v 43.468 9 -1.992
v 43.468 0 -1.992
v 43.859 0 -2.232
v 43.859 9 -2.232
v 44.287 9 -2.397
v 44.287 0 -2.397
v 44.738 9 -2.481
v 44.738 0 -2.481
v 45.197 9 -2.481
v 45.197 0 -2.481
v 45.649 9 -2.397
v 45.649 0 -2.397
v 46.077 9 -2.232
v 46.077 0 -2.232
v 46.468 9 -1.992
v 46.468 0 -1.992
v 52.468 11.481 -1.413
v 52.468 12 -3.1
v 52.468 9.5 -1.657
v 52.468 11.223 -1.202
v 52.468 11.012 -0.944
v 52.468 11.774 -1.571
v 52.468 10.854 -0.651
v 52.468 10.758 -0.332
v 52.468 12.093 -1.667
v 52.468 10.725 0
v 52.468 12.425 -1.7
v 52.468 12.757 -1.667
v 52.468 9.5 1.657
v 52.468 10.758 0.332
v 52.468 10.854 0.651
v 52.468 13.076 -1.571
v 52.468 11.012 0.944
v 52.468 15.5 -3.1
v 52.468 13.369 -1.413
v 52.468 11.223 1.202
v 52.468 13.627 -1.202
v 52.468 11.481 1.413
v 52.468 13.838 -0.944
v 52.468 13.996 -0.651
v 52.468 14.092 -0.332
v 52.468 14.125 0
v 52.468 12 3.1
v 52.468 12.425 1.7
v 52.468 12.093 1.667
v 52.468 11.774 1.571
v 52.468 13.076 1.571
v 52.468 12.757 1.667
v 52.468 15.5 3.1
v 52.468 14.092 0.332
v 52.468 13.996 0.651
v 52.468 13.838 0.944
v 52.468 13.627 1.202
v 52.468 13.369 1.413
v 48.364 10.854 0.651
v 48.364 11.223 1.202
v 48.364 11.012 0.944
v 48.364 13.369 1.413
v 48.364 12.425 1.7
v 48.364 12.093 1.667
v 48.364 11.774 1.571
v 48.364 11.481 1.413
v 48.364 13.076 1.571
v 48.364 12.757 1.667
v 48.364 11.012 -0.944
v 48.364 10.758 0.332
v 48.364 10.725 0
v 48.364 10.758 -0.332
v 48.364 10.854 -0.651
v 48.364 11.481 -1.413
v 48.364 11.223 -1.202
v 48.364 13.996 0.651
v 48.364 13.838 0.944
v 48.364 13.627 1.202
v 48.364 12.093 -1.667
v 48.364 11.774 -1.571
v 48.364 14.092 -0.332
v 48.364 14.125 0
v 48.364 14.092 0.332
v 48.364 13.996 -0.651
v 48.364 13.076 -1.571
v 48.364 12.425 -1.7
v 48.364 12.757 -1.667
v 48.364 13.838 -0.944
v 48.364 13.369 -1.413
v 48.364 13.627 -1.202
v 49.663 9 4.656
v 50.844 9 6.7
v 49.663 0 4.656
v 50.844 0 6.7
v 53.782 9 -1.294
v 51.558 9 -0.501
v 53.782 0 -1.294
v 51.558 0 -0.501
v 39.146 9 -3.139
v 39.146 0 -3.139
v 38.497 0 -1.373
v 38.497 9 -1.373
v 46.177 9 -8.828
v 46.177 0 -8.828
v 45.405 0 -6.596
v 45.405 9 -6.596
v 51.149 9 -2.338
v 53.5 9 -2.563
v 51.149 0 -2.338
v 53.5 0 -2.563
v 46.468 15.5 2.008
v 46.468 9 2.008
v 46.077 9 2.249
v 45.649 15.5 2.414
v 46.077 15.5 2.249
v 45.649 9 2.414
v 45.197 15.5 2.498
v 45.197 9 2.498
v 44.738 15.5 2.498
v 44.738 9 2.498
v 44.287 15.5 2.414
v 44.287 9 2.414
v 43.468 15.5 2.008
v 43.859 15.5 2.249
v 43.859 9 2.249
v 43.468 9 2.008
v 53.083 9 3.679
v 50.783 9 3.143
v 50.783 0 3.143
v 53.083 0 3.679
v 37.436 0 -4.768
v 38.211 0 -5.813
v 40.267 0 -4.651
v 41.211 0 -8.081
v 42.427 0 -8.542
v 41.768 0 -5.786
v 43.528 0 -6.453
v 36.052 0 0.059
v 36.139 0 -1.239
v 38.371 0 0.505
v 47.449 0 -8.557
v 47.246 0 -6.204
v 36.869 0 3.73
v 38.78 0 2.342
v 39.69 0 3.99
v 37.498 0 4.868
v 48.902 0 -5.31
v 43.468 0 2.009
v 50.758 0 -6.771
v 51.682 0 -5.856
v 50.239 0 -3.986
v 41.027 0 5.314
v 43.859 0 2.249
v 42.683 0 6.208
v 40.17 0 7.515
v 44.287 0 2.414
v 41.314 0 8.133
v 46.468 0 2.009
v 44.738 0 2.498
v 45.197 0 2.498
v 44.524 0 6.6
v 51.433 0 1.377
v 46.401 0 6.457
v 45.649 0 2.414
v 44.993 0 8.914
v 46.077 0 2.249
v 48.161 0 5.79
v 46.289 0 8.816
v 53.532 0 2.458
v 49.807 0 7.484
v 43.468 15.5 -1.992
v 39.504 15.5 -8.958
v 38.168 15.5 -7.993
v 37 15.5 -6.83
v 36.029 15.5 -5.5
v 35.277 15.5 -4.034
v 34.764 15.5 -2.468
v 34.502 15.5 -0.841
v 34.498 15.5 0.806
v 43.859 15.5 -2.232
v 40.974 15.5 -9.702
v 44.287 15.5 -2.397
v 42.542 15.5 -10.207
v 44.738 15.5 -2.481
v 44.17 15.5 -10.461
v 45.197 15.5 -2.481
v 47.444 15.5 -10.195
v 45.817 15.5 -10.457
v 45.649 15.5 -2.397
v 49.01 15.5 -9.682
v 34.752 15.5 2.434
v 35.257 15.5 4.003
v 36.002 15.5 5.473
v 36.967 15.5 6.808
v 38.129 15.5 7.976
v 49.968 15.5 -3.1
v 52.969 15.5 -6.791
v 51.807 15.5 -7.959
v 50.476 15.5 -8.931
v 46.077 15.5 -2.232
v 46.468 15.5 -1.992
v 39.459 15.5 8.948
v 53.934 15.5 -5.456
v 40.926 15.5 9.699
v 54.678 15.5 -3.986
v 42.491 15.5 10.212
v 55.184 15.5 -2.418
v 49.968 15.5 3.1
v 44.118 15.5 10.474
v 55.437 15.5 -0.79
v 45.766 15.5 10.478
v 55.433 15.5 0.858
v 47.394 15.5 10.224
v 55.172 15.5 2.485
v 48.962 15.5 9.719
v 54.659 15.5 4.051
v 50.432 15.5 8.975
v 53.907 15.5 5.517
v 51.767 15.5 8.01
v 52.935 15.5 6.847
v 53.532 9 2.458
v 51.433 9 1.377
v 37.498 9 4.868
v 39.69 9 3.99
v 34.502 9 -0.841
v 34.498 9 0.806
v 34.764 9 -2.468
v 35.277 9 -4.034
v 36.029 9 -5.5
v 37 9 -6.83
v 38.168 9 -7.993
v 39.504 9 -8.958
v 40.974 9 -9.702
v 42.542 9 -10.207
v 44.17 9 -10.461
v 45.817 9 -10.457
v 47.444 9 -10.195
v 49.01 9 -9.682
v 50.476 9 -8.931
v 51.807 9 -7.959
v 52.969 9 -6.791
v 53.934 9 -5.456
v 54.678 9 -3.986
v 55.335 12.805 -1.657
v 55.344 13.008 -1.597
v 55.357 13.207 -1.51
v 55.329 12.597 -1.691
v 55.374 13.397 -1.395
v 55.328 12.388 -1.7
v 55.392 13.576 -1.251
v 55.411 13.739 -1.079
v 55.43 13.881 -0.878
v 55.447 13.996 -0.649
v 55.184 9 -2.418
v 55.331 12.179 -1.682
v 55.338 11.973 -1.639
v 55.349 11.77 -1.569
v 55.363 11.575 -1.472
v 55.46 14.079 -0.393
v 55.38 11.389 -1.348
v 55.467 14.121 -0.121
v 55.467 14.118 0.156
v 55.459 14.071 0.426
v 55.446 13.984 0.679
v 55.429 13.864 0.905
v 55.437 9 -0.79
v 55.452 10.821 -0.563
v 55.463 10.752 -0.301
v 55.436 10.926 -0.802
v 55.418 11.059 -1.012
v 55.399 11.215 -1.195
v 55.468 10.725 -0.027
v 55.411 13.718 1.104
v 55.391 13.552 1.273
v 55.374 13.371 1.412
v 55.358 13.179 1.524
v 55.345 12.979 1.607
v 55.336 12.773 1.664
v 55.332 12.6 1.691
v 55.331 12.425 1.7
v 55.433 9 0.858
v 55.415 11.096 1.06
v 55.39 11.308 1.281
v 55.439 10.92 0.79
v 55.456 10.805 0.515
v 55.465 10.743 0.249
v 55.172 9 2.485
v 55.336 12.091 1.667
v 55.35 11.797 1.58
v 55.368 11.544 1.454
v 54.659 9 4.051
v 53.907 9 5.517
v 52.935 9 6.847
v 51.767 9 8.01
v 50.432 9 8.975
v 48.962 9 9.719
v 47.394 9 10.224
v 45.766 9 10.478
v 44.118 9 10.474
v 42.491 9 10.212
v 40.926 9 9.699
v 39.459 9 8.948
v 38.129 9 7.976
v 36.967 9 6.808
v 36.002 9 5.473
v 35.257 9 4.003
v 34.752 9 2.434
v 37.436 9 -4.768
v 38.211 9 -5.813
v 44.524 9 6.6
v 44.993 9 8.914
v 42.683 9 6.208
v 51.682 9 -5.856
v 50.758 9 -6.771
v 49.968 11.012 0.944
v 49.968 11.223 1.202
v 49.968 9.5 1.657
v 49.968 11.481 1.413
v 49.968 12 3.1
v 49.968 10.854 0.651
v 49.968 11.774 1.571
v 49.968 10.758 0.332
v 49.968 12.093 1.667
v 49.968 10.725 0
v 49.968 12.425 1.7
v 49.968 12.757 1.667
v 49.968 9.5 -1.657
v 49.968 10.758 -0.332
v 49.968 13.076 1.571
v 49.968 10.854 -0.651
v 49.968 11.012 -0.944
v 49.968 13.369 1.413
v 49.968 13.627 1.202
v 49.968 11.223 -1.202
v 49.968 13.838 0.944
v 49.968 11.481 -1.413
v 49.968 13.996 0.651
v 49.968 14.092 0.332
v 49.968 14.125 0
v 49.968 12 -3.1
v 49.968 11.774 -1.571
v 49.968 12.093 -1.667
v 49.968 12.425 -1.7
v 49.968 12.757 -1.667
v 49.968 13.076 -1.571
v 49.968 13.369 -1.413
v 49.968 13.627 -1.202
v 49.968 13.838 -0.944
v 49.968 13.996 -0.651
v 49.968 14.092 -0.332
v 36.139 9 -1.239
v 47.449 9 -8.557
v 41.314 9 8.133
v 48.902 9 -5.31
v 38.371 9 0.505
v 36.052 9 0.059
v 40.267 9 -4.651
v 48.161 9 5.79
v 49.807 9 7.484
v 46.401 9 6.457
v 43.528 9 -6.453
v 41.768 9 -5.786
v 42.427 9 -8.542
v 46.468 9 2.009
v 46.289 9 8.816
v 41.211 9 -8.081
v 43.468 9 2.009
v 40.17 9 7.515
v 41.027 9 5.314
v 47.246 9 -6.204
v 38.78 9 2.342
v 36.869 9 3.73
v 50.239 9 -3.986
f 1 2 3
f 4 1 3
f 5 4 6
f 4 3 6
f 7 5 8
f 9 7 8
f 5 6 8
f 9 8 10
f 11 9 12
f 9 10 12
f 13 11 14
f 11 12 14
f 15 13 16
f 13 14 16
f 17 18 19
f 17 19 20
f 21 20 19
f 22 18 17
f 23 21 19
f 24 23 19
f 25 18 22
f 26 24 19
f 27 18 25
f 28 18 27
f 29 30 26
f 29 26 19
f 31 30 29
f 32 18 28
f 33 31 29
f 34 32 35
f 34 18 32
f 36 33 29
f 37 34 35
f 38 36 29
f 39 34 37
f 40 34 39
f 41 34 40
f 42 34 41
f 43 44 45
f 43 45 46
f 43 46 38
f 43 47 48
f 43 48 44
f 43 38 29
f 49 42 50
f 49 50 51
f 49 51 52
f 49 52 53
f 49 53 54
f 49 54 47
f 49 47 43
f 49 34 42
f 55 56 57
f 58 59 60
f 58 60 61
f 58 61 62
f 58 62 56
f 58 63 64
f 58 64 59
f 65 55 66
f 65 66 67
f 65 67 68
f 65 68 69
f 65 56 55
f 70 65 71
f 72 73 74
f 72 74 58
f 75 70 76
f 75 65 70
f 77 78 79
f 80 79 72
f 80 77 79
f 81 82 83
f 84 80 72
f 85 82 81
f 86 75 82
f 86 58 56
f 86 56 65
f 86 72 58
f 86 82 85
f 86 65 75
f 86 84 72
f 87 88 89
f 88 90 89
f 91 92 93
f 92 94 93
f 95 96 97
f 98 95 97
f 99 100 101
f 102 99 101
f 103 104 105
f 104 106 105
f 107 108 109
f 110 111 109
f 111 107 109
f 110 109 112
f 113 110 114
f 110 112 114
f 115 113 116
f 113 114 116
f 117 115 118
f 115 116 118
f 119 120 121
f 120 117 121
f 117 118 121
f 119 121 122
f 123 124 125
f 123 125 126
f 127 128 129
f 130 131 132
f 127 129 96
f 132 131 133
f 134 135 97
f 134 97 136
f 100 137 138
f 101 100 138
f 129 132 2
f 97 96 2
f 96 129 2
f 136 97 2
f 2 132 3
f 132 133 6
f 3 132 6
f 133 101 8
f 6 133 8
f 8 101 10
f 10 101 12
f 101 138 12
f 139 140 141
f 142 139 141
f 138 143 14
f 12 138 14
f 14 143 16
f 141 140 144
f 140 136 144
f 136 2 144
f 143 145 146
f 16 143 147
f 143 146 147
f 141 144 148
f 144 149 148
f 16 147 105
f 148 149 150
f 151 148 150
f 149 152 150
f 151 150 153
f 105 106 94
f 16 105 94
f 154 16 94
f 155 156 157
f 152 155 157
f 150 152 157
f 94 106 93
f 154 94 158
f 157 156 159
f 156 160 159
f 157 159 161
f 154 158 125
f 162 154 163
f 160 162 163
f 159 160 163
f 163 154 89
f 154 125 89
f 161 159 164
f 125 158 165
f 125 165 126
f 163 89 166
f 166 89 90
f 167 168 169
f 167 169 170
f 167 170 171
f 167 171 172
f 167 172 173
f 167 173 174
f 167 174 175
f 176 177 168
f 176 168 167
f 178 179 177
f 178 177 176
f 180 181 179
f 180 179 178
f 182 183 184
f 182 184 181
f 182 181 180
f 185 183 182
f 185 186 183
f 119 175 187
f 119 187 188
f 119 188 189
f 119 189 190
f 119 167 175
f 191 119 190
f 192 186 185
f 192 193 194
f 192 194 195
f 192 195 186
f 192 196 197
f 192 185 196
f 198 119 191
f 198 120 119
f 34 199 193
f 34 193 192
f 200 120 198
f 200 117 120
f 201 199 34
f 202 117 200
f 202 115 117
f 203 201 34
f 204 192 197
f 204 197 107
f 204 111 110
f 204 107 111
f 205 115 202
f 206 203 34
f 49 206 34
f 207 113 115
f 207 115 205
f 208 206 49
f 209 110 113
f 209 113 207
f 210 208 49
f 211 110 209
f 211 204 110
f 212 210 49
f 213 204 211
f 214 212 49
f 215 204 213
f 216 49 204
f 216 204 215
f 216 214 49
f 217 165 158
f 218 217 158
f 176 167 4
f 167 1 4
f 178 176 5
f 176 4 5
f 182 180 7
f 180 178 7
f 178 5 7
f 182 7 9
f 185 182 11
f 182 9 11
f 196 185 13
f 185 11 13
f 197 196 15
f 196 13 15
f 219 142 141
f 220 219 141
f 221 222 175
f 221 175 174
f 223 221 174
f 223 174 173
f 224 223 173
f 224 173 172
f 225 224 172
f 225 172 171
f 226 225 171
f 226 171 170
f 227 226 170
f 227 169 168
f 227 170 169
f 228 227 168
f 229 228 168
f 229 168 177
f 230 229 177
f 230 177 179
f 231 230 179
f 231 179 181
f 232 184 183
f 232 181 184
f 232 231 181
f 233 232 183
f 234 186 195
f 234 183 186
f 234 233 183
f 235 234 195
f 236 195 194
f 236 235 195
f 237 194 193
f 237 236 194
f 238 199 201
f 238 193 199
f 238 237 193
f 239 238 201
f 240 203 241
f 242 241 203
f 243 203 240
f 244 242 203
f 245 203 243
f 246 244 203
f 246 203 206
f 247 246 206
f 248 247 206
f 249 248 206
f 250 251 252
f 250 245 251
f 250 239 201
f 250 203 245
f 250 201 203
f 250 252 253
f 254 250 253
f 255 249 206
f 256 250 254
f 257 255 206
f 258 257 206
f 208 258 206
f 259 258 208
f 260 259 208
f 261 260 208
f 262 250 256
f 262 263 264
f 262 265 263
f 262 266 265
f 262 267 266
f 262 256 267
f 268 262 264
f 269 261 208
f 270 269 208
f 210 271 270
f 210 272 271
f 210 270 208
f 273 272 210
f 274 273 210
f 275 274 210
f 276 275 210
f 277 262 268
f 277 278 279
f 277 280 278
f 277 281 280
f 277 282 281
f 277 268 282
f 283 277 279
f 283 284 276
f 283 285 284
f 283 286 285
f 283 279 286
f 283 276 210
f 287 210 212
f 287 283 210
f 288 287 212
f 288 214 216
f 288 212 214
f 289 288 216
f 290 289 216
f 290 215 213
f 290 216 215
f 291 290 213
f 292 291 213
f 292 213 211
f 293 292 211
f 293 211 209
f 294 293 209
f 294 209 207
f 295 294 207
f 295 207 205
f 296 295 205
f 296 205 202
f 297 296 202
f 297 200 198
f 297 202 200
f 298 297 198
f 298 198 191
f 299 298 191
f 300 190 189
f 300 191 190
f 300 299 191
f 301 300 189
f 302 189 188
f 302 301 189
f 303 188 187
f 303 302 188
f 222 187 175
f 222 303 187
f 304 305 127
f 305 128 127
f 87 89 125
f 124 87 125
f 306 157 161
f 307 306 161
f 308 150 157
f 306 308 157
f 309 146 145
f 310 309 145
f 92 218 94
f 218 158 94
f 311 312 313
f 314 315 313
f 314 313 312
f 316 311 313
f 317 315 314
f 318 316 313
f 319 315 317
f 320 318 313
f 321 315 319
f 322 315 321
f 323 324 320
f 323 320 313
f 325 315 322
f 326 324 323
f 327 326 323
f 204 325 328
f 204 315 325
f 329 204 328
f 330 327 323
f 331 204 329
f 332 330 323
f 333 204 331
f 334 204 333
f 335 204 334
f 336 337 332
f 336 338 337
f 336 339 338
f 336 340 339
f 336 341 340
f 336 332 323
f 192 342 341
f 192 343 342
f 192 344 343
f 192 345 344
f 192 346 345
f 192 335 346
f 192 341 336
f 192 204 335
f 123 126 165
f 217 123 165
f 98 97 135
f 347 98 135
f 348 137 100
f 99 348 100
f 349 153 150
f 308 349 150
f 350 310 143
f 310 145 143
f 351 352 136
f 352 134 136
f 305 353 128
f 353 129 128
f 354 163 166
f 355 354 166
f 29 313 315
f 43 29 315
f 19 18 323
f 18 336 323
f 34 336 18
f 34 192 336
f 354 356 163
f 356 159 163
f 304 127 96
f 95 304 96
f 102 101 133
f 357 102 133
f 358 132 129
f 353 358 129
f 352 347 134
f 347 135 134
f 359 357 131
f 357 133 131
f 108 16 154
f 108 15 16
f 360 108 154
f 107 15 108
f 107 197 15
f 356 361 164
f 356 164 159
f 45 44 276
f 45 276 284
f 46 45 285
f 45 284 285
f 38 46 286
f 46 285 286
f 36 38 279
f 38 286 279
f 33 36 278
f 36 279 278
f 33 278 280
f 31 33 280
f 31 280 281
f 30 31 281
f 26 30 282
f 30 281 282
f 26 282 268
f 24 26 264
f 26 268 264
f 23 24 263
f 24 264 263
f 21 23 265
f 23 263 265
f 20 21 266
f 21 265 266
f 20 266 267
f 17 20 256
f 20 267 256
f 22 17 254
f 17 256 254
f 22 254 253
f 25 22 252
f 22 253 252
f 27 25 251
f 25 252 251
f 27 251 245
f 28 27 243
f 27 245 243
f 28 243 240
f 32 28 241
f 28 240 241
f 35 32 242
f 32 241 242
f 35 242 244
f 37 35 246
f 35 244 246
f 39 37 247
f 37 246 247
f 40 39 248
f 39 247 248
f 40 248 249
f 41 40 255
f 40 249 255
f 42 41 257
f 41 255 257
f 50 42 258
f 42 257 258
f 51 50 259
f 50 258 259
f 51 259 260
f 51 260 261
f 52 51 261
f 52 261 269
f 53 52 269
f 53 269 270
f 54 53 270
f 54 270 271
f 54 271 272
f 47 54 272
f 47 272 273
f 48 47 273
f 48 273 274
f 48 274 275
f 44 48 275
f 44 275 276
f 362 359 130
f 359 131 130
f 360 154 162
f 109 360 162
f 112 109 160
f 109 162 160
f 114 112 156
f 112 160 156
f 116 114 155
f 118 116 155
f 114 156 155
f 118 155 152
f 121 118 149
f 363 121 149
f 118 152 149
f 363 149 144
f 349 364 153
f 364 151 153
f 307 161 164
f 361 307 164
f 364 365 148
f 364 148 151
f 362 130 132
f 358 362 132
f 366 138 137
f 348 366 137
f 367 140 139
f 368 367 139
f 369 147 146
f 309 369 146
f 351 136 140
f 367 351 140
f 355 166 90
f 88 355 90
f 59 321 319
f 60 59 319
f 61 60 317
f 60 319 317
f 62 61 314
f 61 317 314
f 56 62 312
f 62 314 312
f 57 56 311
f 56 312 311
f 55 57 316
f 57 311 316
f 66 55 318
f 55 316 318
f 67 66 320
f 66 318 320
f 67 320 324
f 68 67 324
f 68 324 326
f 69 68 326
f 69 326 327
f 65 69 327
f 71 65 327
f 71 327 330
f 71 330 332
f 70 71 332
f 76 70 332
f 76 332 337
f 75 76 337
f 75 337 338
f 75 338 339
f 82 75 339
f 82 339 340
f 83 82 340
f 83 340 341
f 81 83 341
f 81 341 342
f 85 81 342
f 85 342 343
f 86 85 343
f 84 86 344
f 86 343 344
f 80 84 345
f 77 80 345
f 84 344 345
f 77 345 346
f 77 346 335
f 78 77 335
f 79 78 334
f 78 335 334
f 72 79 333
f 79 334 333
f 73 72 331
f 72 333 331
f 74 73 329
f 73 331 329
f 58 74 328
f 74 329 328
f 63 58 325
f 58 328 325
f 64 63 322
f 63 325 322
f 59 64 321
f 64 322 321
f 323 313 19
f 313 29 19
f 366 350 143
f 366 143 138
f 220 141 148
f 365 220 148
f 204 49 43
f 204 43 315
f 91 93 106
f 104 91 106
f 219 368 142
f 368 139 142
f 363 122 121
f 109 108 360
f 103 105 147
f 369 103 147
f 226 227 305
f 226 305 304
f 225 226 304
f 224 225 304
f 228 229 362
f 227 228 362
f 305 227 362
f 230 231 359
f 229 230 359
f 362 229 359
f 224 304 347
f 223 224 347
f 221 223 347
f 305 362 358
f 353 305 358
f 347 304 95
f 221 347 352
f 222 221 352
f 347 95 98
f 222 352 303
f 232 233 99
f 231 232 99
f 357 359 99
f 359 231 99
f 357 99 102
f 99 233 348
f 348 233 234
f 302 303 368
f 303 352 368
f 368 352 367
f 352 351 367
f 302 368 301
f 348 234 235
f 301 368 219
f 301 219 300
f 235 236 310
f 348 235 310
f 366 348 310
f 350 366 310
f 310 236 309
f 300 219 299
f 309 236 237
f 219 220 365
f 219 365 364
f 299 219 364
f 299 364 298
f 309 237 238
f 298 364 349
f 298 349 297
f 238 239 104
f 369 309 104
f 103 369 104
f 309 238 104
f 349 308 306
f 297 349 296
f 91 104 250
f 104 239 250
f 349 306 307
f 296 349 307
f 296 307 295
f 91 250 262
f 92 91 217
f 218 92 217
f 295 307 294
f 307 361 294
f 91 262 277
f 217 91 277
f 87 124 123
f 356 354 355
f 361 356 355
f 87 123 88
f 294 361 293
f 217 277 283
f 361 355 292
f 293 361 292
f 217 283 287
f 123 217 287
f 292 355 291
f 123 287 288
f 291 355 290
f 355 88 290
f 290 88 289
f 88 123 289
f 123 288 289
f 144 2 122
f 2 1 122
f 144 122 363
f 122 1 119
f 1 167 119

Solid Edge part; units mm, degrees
sketch "Sketch1" plane through (0, 0, 0) normal (0, -1, 0) x (1, 0, 0)
  line L0 (46.2892, 8.8157) -> (46.4009, 6.4567)
  line L1 (46.4009, 6.4567) -> (48.1612, 5.7905)
  line L2 (48.1612, 5.7905) -> (49.8066, 7.4845)
  line L3 (49.8066, 7.4845) -> (50.8439, 6.7003)
  line L4 (50.8439, 6.7003) -> (49.6626, 4.6555)
  line L5 (49.6626, 4.6555) -> (50.7833, 3.1434)
  line L6 (50.7833, 3.1434) -> (53.0833, 3.679)
  line L7 (53.0833, 3.679) -> (53.5319, 2.4584)
  line L8 (53.5319, 2.4584) -> (51.4326, 1.3769)
  line L9 (51.4326, 1.3769) -> (51.5579, -0.5011)
  line L10 (51.5579, -0.5011) -> (53.7824, -1.2941)
  line L11 (53.7824, -1.2941) -> (53.4999, -2.5634)
  line L12 (53.4999, -2.5634) -> (51.1491, -2.3382)
  line L13 (51.1491, -2.3382) -> (50.2393, -3.9858)
  line L14 (50.2393, -3.9858) -> (51.6818, -5.8556)
  line L15 (51.6818, -5.8556) -> (50.7579, -6.7706)
  line L16 (50.7579, -6.7706) -> (48.9022, -5.3101)
  line L17 (48.9022, -5.3101) -> (47.2459, -6.2045)
  line L18 (47.2459, -6.2045) -> (47.4486, -8.5573)
  line L19 (47.4486, -8.5573) -> (46.1767, -8.8276)
  line L20 (46.1767, -8.8276) -> (45.4049, -6.5958)
  line L21 (45.4049, -6.5958) -> (43.5283, -6.4526)
  line L22 (43.5283, -6.4526) -> (42.4267, -8.5415)
  line L23 (42.4267, -8.5415) -> (41.2106, -8.0813)
  line L24 (41.2106, -8.0813) -> (41.768, -5.7865)
  line L25 (41.768, -5.7865) -> (40.2667, -4.6514)
  line L26 (40.2667, -4.6514) -> (38.2107, -5.8132)
  line L27 (38.2107, -5.8132) -> (37.4364, -4.7685)
  line L28 (37.4364, -4.7685) -> (39.1459, -3.1393)
  line L29 (39.1459, -3.1393) -> (38.4966, -1.3728)
  line L30 (38.4966, -1.3728) -> (36.1389, -1.2386)
  line L31 (36.1389, -1.2386) -> (36.0523, 0.0589)
  line L32 (36.0523, 0.0589) -> (38.3713, 0.5052)
  line L33 (38.3713, 0.5052) -> (38.7801, 2.3423)
  line L34 (38.7801, 2.3423) -> (36.8691, 3.73)
  line L35 (36.8691, 3.73) -> (37.498, 4.8685)
  line L36 (37.498, 4.8685) -> (39.6899, 3.99)
  line L37 (39.6899, 3.99) -> (41.0271, 5.3145)
  line L38 (41.0271, 5.3145) -> (40.1697, 7.5148)
  line L39 (40.1697, 7.5148) -> (41.314, 8.1329)
  line L40 (41.314, 8.1329) -> (42.683, 6.2081)
  line L41 (42.683, 6.2081) -> (44.5236, 6.5998)
  line L42 (44.5236, 6.5998) -> (44.9926, 8.9145)
  line L43 (44.9926, 8.9145) -> (46.2892, 8.8157)
  circle A0 centre (44.9678, 0.0085) radius 2.5
  dimension "D1" = 5
extrude "Protrusion1" add sketch "Sketch1" against normal blind 9
sketch "Sketch2" plane through (44.9173, 9, 0.0434) normal (0, 1, 0) x (-0.9971, 0, 0.076)
  circle A0 centre (-0.053, -0.031) radius 10.5
  circle A1 centre (-0.053, -0.031) radius 2.5
extrude "ExtrudedProtrusion_2" add sketch "Sketch2" along normal blind 6.5
sketch "Sketch3" plane through (44.9678, 15.5, 0.0085) normal (0, 1, 0) x (0, 0, 1)
  line L0 (-3.1085, 7.5) -> (3.0915, 7.5)
  line L1 (3.0915, 7.5) -> (3.0915, 5)
  line L2 (3.0915, 5) -> (-3.1085, 5)
  line L3 (-3.1085, 5) -> (-3.1085, 7.5)
  dimension "D1" = 6.2
  dimension "D2" = 2.5
  dimension "D3" = 3
  dimension "D4" = 2.5
extrude "ExtrudedCutout_1" cut sketch "Sketch3" against normal blind 6
sketch "Sketch4" plane through (49.9678, 12.8, 0) normal (1, 0, 0) x (0, -1, 0)
  line L0 (3.3, -3.1) -> (3.3, -1.6566)
  line L1 (3.3, -1.6566) -> (0.8, -3.1)
  line L2 (0.8, -3.1) -> (3.3, -3.1)
  line L3 (0.8, 3.1) -> (3.3, 1.6566)
  line L4 (3.3, 1.6566) -> (3.3, 3.1)
  line L5 (3.3, 3.1) -> (0.8, 3.1)
  dimension "D1" = 2.5
  dimension "D2" = 3.08
  dimension "D3" = 6.15
extrude "Protrusion2" add sketch "Sketch4" along normal up to vertex (2.5 mm away)
sketch "Sketch5" plane through (49.9678, 12.7, 0) normal (1, 0, 0) x (0, 0, 1)
  circle A0 centre (0, 0.275) radius 1.7
  dimension "D1" = 3.075
extrude "Cutout1" cut sketch "Sketch5" against normal up to vertex (5 mm away) and the other way up to vertex (5.5 mm away)
sketch "Sketch6" plane through (44.9678, 15.5, 0.0085) normal (0, 1, 0) x (1, 0, 0)
  line L0 (3.3967, 3.7849) -> (1.5, 3.7849)
  line L1 (1.5, 3.7849) -> (1.5, -3.5131)
  line L2 (1.5, -3.5131) -> (3.3967, -3.5131)
  line L3 (3.3967, -3.5131) -> (3.3967, 3.7849)
  line L4 (-3.7072, 3.8625) -> (-1.5, 3.8625)
  line L5 (-1.5, 3.8625) -> (-1.5, -3.5519)
  line L6 (-1.5, -3.5519) -> (-3.7072, -3.5519)
  line L7 (-3.7072, -3.5519) -> (-3.7072, 3.8625)
  dimension "D1" = 1
  dimension "D2" = 1
extrude "Protrusion3" add sketch "Sketch6" against normal up to vertex (15.5 mm away)
